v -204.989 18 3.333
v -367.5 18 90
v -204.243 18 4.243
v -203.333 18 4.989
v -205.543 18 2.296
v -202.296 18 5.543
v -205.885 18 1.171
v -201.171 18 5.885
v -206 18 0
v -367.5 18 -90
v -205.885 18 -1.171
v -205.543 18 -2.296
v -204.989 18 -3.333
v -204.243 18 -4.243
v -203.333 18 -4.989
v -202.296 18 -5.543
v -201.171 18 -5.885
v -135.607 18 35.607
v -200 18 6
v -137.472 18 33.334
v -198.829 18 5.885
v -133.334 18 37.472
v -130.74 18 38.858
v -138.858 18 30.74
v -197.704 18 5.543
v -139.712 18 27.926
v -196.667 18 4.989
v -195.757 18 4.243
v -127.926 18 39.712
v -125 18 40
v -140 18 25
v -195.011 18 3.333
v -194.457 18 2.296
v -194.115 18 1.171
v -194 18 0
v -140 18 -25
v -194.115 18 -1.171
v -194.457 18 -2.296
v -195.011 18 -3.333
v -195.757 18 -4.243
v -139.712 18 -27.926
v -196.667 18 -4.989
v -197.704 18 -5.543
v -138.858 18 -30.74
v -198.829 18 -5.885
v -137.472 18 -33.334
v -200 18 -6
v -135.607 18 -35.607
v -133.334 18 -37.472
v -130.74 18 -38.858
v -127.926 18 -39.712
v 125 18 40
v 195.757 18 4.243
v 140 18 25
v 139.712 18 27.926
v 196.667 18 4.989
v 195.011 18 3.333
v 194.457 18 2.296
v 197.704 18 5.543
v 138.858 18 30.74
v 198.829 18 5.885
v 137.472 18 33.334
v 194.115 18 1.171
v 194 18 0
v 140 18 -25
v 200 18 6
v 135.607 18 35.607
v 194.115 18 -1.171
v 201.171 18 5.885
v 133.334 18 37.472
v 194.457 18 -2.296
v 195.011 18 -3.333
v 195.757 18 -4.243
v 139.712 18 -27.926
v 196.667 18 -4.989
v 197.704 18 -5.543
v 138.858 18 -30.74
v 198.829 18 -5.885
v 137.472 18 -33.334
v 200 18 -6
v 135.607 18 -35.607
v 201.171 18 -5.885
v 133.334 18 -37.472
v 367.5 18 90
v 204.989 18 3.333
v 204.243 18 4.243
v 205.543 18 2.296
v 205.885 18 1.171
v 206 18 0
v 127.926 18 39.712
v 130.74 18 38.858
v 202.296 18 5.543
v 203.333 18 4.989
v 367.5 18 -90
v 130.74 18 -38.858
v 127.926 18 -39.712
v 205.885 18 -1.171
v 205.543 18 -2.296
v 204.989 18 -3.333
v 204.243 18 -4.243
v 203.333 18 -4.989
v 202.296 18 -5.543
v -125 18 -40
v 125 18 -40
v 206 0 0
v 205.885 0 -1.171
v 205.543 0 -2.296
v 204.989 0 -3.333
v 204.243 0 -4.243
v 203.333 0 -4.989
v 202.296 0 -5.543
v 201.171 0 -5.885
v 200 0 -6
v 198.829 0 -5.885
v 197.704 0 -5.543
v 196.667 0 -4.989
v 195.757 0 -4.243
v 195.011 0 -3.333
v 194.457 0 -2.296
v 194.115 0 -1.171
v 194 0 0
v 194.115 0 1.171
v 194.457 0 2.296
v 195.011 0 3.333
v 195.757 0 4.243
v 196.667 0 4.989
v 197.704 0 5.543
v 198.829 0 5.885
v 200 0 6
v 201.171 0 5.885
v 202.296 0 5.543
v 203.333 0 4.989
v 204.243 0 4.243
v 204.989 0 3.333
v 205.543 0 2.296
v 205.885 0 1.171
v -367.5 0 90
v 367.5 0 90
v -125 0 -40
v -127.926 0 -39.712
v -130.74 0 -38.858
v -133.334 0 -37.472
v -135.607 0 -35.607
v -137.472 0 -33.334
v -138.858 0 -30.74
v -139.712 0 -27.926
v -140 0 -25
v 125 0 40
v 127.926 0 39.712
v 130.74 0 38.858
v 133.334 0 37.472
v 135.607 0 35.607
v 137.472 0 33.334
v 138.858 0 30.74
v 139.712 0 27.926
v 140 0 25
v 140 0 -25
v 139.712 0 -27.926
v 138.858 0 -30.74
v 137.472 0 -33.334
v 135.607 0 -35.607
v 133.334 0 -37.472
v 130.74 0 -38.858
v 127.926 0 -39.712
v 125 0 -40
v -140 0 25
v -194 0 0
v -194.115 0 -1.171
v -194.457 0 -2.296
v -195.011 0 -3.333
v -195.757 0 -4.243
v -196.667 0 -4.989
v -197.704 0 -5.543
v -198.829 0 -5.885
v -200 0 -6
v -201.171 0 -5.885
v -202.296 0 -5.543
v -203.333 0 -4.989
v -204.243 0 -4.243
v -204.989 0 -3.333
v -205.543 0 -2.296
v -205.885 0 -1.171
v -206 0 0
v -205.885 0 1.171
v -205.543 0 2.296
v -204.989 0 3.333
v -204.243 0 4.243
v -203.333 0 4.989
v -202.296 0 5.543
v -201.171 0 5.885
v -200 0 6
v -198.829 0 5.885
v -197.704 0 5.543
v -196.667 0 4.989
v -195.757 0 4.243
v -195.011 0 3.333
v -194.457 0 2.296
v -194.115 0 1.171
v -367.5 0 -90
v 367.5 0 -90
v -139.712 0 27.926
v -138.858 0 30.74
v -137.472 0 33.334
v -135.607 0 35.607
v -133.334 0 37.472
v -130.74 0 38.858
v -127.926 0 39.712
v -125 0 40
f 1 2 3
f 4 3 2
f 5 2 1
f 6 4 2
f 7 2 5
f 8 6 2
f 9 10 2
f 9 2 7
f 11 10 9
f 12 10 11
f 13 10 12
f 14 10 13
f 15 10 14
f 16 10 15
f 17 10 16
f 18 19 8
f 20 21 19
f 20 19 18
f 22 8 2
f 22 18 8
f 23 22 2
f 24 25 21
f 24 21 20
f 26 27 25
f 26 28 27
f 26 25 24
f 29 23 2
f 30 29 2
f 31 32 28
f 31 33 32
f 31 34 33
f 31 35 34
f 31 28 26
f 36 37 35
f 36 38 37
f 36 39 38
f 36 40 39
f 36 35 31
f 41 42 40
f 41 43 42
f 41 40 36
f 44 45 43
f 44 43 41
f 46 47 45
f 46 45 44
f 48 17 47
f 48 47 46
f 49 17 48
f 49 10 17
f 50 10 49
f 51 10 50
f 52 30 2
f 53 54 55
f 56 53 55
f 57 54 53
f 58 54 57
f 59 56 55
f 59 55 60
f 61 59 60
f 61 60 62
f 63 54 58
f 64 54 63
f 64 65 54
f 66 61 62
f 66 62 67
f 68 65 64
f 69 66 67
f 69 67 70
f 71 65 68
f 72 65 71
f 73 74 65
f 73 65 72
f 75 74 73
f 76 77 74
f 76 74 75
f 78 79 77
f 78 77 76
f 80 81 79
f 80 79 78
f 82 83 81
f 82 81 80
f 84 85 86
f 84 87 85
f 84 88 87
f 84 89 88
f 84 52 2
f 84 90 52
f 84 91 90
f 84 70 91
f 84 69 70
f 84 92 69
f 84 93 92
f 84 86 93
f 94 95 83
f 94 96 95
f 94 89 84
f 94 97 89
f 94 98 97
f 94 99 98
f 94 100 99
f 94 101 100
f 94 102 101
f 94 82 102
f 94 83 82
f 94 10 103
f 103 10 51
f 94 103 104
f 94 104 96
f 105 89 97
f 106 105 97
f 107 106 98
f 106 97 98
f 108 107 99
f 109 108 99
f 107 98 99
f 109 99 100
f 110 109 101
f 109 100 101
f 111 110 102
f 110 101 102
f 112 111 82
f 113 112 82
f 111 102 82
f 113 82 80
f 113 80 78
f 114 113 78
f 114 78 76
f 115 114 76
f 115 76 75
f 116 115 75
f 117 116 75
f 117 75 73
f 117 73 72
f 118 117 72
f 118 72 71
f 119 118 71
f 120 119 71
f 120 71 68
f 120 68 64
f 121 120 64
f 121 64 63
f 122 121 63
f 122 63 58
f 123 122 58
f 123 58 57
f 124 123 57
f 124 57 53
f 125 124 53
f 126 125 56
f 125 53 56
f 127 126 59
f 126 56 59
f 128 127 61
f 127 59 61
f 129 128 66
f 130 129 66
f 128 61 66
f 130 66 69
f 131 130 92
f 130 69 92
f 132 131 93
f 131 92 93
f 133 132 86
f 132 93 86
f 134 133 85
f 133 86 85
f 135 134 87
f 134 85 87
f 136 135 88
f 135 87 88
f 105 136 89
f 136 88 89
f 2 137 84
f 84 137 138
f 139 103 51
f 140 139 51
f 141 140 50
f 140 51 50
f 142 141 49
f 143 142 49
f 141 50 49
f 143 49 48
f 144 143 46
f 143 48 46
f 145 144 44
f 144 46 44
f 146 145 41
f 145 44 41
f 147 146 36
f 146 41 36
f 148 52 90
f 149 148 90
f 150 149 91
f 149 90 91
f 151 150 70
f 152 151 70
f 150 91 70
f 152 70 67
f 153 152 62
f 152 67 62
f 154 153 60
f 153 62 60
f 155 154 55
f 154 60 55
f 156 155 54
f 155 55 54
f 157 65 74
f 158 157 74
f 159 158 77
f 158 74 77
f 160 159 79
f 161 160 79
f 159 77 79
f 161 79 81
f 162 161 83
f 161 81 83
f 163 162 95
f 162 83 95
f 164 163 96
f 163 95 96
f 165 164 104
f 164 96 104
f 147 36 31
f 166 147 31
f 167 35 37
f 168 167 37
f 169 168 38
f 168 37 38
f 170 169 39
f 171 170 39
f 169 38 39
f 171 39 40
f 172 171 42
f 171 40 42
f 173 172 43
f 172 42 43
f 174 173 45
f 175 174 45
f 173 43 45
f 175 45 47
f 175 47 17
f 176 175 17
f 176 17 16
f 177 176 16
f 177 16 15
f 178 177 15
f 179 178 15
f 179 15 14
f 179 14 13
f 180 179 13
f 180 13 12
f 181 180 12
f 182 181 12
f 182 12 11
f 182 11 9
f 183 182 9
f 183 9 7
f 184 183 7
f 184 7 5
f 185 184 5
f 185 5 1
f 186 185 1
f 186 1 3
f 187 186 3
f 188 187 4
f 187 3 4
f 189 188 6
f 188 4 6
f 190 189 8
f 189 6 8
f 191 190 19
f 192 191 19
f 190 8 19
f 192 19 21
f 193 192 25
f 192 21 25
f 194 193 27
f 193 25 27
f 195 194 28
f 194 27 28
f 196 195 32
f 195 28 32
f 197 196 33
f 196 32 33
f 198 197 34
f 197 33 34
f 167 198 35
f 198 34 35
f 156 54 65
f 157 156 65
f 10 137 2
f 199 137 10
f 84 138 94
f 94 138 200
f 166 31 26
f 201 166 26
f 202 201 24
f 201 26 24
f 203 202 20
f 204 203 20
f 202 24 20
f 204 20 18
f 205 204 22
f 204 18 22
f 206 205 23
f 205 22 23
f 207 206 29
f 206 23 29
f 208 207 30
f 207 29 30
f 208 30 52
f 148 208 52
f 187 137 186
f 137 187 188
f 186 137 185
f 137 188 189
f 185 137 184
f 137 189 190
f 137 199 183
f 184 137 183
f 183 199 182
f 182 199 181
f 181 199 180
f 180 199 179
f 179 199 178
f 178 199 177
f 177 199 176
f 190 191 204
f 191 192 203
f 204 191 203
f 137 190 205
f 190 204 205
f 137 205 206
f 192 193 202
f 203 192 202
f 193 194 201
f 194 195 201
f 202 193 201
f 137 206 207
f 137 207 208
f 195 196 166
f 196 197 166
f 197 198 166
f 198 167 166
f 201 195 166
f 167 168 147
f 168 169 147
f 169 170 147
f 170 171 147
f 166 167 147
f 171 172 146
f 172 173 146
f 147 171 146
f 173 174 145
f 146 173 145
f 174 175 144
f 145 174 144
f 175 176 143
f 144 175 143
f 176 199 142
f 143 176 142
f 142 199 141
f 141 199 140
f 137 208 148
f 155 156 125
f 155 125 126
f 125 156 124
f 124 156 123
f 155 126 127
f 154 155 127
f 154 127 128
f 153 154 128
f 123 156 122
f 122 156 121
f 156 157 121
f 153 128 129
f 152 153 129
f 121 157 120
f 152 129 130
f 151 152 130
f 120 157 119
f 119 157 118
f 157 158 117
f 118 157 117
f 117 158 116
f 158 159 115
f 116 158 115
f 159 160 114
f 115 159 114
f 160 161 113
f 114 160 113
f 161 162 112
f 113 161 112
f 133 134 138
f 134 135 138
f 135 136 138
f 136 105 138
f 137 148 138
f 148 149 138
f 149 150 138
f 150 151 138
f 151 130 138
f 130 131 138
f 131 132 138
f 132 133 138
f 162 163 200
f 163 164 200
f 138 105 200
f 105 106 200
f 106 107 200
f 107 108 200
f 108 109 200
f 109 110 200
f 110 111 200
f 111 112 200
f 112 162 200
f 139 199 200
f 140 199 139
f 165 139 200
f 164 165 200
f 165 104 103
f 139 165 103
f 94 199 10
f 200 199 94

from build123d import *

# Parameters (mm, degrees)
SKETCH1_W           = 735
SKETCH1_H           = 180
BOSS_EXTRUDE1_DEPTH = 18
SKETCH2_R           = 6
CUT_EXTRUDE1_DEPTH  = 60


with BuildPart() as part:
    # Sketch1 → Boss-Extrude1 (new body)
    with BuildSketch(Plane(origin=(0, 0, 0), x_dir=(1, 0, 0), z_dir=(0, 1, 0))):
        Rectangle(SKETCH1_W, SKETCH1_H)
    extrude(amount=BOSS_EXTRUDE1_DEPTH)

    # Sketch2 → Cut-Extrude1 (cut)
    with BuildSketch(Plane(origin=(0, 18, 0), x_dir=(1, 0, 0), z_dir=(0, 1, 0))):
        with Locations((-200, 0)):
            Circle(SKETCH2_R)
        with Locations((200, 0)):
            Circle(SKETCH2_R)
        with BuildLine():
            Line((-125, -40), (125, -40))
            ThreePointArc((125, -40), (135.606601718, -35.606601718), (140, -25))
            Line((140, -25), (140, 25))
            ThreePointArc((140, 25), (135.606601718, 35.606601718), (125, 40))
            Line((125, 40), (-125, 40))
            ThreePointArc((-125, 40), (-135.606601718, 35.606601718), (-140, 25))
            Line((-140, 25), (-140, -25))
            ThreePointArc((-140, -25), (-135.606601718, -35.606601718), (-125, -40))
        make_face()
    extrude(amount=-CUT_EXTRUDE1_DEPTH, mode=Mode.SUBTRACT)


solid = part.part
